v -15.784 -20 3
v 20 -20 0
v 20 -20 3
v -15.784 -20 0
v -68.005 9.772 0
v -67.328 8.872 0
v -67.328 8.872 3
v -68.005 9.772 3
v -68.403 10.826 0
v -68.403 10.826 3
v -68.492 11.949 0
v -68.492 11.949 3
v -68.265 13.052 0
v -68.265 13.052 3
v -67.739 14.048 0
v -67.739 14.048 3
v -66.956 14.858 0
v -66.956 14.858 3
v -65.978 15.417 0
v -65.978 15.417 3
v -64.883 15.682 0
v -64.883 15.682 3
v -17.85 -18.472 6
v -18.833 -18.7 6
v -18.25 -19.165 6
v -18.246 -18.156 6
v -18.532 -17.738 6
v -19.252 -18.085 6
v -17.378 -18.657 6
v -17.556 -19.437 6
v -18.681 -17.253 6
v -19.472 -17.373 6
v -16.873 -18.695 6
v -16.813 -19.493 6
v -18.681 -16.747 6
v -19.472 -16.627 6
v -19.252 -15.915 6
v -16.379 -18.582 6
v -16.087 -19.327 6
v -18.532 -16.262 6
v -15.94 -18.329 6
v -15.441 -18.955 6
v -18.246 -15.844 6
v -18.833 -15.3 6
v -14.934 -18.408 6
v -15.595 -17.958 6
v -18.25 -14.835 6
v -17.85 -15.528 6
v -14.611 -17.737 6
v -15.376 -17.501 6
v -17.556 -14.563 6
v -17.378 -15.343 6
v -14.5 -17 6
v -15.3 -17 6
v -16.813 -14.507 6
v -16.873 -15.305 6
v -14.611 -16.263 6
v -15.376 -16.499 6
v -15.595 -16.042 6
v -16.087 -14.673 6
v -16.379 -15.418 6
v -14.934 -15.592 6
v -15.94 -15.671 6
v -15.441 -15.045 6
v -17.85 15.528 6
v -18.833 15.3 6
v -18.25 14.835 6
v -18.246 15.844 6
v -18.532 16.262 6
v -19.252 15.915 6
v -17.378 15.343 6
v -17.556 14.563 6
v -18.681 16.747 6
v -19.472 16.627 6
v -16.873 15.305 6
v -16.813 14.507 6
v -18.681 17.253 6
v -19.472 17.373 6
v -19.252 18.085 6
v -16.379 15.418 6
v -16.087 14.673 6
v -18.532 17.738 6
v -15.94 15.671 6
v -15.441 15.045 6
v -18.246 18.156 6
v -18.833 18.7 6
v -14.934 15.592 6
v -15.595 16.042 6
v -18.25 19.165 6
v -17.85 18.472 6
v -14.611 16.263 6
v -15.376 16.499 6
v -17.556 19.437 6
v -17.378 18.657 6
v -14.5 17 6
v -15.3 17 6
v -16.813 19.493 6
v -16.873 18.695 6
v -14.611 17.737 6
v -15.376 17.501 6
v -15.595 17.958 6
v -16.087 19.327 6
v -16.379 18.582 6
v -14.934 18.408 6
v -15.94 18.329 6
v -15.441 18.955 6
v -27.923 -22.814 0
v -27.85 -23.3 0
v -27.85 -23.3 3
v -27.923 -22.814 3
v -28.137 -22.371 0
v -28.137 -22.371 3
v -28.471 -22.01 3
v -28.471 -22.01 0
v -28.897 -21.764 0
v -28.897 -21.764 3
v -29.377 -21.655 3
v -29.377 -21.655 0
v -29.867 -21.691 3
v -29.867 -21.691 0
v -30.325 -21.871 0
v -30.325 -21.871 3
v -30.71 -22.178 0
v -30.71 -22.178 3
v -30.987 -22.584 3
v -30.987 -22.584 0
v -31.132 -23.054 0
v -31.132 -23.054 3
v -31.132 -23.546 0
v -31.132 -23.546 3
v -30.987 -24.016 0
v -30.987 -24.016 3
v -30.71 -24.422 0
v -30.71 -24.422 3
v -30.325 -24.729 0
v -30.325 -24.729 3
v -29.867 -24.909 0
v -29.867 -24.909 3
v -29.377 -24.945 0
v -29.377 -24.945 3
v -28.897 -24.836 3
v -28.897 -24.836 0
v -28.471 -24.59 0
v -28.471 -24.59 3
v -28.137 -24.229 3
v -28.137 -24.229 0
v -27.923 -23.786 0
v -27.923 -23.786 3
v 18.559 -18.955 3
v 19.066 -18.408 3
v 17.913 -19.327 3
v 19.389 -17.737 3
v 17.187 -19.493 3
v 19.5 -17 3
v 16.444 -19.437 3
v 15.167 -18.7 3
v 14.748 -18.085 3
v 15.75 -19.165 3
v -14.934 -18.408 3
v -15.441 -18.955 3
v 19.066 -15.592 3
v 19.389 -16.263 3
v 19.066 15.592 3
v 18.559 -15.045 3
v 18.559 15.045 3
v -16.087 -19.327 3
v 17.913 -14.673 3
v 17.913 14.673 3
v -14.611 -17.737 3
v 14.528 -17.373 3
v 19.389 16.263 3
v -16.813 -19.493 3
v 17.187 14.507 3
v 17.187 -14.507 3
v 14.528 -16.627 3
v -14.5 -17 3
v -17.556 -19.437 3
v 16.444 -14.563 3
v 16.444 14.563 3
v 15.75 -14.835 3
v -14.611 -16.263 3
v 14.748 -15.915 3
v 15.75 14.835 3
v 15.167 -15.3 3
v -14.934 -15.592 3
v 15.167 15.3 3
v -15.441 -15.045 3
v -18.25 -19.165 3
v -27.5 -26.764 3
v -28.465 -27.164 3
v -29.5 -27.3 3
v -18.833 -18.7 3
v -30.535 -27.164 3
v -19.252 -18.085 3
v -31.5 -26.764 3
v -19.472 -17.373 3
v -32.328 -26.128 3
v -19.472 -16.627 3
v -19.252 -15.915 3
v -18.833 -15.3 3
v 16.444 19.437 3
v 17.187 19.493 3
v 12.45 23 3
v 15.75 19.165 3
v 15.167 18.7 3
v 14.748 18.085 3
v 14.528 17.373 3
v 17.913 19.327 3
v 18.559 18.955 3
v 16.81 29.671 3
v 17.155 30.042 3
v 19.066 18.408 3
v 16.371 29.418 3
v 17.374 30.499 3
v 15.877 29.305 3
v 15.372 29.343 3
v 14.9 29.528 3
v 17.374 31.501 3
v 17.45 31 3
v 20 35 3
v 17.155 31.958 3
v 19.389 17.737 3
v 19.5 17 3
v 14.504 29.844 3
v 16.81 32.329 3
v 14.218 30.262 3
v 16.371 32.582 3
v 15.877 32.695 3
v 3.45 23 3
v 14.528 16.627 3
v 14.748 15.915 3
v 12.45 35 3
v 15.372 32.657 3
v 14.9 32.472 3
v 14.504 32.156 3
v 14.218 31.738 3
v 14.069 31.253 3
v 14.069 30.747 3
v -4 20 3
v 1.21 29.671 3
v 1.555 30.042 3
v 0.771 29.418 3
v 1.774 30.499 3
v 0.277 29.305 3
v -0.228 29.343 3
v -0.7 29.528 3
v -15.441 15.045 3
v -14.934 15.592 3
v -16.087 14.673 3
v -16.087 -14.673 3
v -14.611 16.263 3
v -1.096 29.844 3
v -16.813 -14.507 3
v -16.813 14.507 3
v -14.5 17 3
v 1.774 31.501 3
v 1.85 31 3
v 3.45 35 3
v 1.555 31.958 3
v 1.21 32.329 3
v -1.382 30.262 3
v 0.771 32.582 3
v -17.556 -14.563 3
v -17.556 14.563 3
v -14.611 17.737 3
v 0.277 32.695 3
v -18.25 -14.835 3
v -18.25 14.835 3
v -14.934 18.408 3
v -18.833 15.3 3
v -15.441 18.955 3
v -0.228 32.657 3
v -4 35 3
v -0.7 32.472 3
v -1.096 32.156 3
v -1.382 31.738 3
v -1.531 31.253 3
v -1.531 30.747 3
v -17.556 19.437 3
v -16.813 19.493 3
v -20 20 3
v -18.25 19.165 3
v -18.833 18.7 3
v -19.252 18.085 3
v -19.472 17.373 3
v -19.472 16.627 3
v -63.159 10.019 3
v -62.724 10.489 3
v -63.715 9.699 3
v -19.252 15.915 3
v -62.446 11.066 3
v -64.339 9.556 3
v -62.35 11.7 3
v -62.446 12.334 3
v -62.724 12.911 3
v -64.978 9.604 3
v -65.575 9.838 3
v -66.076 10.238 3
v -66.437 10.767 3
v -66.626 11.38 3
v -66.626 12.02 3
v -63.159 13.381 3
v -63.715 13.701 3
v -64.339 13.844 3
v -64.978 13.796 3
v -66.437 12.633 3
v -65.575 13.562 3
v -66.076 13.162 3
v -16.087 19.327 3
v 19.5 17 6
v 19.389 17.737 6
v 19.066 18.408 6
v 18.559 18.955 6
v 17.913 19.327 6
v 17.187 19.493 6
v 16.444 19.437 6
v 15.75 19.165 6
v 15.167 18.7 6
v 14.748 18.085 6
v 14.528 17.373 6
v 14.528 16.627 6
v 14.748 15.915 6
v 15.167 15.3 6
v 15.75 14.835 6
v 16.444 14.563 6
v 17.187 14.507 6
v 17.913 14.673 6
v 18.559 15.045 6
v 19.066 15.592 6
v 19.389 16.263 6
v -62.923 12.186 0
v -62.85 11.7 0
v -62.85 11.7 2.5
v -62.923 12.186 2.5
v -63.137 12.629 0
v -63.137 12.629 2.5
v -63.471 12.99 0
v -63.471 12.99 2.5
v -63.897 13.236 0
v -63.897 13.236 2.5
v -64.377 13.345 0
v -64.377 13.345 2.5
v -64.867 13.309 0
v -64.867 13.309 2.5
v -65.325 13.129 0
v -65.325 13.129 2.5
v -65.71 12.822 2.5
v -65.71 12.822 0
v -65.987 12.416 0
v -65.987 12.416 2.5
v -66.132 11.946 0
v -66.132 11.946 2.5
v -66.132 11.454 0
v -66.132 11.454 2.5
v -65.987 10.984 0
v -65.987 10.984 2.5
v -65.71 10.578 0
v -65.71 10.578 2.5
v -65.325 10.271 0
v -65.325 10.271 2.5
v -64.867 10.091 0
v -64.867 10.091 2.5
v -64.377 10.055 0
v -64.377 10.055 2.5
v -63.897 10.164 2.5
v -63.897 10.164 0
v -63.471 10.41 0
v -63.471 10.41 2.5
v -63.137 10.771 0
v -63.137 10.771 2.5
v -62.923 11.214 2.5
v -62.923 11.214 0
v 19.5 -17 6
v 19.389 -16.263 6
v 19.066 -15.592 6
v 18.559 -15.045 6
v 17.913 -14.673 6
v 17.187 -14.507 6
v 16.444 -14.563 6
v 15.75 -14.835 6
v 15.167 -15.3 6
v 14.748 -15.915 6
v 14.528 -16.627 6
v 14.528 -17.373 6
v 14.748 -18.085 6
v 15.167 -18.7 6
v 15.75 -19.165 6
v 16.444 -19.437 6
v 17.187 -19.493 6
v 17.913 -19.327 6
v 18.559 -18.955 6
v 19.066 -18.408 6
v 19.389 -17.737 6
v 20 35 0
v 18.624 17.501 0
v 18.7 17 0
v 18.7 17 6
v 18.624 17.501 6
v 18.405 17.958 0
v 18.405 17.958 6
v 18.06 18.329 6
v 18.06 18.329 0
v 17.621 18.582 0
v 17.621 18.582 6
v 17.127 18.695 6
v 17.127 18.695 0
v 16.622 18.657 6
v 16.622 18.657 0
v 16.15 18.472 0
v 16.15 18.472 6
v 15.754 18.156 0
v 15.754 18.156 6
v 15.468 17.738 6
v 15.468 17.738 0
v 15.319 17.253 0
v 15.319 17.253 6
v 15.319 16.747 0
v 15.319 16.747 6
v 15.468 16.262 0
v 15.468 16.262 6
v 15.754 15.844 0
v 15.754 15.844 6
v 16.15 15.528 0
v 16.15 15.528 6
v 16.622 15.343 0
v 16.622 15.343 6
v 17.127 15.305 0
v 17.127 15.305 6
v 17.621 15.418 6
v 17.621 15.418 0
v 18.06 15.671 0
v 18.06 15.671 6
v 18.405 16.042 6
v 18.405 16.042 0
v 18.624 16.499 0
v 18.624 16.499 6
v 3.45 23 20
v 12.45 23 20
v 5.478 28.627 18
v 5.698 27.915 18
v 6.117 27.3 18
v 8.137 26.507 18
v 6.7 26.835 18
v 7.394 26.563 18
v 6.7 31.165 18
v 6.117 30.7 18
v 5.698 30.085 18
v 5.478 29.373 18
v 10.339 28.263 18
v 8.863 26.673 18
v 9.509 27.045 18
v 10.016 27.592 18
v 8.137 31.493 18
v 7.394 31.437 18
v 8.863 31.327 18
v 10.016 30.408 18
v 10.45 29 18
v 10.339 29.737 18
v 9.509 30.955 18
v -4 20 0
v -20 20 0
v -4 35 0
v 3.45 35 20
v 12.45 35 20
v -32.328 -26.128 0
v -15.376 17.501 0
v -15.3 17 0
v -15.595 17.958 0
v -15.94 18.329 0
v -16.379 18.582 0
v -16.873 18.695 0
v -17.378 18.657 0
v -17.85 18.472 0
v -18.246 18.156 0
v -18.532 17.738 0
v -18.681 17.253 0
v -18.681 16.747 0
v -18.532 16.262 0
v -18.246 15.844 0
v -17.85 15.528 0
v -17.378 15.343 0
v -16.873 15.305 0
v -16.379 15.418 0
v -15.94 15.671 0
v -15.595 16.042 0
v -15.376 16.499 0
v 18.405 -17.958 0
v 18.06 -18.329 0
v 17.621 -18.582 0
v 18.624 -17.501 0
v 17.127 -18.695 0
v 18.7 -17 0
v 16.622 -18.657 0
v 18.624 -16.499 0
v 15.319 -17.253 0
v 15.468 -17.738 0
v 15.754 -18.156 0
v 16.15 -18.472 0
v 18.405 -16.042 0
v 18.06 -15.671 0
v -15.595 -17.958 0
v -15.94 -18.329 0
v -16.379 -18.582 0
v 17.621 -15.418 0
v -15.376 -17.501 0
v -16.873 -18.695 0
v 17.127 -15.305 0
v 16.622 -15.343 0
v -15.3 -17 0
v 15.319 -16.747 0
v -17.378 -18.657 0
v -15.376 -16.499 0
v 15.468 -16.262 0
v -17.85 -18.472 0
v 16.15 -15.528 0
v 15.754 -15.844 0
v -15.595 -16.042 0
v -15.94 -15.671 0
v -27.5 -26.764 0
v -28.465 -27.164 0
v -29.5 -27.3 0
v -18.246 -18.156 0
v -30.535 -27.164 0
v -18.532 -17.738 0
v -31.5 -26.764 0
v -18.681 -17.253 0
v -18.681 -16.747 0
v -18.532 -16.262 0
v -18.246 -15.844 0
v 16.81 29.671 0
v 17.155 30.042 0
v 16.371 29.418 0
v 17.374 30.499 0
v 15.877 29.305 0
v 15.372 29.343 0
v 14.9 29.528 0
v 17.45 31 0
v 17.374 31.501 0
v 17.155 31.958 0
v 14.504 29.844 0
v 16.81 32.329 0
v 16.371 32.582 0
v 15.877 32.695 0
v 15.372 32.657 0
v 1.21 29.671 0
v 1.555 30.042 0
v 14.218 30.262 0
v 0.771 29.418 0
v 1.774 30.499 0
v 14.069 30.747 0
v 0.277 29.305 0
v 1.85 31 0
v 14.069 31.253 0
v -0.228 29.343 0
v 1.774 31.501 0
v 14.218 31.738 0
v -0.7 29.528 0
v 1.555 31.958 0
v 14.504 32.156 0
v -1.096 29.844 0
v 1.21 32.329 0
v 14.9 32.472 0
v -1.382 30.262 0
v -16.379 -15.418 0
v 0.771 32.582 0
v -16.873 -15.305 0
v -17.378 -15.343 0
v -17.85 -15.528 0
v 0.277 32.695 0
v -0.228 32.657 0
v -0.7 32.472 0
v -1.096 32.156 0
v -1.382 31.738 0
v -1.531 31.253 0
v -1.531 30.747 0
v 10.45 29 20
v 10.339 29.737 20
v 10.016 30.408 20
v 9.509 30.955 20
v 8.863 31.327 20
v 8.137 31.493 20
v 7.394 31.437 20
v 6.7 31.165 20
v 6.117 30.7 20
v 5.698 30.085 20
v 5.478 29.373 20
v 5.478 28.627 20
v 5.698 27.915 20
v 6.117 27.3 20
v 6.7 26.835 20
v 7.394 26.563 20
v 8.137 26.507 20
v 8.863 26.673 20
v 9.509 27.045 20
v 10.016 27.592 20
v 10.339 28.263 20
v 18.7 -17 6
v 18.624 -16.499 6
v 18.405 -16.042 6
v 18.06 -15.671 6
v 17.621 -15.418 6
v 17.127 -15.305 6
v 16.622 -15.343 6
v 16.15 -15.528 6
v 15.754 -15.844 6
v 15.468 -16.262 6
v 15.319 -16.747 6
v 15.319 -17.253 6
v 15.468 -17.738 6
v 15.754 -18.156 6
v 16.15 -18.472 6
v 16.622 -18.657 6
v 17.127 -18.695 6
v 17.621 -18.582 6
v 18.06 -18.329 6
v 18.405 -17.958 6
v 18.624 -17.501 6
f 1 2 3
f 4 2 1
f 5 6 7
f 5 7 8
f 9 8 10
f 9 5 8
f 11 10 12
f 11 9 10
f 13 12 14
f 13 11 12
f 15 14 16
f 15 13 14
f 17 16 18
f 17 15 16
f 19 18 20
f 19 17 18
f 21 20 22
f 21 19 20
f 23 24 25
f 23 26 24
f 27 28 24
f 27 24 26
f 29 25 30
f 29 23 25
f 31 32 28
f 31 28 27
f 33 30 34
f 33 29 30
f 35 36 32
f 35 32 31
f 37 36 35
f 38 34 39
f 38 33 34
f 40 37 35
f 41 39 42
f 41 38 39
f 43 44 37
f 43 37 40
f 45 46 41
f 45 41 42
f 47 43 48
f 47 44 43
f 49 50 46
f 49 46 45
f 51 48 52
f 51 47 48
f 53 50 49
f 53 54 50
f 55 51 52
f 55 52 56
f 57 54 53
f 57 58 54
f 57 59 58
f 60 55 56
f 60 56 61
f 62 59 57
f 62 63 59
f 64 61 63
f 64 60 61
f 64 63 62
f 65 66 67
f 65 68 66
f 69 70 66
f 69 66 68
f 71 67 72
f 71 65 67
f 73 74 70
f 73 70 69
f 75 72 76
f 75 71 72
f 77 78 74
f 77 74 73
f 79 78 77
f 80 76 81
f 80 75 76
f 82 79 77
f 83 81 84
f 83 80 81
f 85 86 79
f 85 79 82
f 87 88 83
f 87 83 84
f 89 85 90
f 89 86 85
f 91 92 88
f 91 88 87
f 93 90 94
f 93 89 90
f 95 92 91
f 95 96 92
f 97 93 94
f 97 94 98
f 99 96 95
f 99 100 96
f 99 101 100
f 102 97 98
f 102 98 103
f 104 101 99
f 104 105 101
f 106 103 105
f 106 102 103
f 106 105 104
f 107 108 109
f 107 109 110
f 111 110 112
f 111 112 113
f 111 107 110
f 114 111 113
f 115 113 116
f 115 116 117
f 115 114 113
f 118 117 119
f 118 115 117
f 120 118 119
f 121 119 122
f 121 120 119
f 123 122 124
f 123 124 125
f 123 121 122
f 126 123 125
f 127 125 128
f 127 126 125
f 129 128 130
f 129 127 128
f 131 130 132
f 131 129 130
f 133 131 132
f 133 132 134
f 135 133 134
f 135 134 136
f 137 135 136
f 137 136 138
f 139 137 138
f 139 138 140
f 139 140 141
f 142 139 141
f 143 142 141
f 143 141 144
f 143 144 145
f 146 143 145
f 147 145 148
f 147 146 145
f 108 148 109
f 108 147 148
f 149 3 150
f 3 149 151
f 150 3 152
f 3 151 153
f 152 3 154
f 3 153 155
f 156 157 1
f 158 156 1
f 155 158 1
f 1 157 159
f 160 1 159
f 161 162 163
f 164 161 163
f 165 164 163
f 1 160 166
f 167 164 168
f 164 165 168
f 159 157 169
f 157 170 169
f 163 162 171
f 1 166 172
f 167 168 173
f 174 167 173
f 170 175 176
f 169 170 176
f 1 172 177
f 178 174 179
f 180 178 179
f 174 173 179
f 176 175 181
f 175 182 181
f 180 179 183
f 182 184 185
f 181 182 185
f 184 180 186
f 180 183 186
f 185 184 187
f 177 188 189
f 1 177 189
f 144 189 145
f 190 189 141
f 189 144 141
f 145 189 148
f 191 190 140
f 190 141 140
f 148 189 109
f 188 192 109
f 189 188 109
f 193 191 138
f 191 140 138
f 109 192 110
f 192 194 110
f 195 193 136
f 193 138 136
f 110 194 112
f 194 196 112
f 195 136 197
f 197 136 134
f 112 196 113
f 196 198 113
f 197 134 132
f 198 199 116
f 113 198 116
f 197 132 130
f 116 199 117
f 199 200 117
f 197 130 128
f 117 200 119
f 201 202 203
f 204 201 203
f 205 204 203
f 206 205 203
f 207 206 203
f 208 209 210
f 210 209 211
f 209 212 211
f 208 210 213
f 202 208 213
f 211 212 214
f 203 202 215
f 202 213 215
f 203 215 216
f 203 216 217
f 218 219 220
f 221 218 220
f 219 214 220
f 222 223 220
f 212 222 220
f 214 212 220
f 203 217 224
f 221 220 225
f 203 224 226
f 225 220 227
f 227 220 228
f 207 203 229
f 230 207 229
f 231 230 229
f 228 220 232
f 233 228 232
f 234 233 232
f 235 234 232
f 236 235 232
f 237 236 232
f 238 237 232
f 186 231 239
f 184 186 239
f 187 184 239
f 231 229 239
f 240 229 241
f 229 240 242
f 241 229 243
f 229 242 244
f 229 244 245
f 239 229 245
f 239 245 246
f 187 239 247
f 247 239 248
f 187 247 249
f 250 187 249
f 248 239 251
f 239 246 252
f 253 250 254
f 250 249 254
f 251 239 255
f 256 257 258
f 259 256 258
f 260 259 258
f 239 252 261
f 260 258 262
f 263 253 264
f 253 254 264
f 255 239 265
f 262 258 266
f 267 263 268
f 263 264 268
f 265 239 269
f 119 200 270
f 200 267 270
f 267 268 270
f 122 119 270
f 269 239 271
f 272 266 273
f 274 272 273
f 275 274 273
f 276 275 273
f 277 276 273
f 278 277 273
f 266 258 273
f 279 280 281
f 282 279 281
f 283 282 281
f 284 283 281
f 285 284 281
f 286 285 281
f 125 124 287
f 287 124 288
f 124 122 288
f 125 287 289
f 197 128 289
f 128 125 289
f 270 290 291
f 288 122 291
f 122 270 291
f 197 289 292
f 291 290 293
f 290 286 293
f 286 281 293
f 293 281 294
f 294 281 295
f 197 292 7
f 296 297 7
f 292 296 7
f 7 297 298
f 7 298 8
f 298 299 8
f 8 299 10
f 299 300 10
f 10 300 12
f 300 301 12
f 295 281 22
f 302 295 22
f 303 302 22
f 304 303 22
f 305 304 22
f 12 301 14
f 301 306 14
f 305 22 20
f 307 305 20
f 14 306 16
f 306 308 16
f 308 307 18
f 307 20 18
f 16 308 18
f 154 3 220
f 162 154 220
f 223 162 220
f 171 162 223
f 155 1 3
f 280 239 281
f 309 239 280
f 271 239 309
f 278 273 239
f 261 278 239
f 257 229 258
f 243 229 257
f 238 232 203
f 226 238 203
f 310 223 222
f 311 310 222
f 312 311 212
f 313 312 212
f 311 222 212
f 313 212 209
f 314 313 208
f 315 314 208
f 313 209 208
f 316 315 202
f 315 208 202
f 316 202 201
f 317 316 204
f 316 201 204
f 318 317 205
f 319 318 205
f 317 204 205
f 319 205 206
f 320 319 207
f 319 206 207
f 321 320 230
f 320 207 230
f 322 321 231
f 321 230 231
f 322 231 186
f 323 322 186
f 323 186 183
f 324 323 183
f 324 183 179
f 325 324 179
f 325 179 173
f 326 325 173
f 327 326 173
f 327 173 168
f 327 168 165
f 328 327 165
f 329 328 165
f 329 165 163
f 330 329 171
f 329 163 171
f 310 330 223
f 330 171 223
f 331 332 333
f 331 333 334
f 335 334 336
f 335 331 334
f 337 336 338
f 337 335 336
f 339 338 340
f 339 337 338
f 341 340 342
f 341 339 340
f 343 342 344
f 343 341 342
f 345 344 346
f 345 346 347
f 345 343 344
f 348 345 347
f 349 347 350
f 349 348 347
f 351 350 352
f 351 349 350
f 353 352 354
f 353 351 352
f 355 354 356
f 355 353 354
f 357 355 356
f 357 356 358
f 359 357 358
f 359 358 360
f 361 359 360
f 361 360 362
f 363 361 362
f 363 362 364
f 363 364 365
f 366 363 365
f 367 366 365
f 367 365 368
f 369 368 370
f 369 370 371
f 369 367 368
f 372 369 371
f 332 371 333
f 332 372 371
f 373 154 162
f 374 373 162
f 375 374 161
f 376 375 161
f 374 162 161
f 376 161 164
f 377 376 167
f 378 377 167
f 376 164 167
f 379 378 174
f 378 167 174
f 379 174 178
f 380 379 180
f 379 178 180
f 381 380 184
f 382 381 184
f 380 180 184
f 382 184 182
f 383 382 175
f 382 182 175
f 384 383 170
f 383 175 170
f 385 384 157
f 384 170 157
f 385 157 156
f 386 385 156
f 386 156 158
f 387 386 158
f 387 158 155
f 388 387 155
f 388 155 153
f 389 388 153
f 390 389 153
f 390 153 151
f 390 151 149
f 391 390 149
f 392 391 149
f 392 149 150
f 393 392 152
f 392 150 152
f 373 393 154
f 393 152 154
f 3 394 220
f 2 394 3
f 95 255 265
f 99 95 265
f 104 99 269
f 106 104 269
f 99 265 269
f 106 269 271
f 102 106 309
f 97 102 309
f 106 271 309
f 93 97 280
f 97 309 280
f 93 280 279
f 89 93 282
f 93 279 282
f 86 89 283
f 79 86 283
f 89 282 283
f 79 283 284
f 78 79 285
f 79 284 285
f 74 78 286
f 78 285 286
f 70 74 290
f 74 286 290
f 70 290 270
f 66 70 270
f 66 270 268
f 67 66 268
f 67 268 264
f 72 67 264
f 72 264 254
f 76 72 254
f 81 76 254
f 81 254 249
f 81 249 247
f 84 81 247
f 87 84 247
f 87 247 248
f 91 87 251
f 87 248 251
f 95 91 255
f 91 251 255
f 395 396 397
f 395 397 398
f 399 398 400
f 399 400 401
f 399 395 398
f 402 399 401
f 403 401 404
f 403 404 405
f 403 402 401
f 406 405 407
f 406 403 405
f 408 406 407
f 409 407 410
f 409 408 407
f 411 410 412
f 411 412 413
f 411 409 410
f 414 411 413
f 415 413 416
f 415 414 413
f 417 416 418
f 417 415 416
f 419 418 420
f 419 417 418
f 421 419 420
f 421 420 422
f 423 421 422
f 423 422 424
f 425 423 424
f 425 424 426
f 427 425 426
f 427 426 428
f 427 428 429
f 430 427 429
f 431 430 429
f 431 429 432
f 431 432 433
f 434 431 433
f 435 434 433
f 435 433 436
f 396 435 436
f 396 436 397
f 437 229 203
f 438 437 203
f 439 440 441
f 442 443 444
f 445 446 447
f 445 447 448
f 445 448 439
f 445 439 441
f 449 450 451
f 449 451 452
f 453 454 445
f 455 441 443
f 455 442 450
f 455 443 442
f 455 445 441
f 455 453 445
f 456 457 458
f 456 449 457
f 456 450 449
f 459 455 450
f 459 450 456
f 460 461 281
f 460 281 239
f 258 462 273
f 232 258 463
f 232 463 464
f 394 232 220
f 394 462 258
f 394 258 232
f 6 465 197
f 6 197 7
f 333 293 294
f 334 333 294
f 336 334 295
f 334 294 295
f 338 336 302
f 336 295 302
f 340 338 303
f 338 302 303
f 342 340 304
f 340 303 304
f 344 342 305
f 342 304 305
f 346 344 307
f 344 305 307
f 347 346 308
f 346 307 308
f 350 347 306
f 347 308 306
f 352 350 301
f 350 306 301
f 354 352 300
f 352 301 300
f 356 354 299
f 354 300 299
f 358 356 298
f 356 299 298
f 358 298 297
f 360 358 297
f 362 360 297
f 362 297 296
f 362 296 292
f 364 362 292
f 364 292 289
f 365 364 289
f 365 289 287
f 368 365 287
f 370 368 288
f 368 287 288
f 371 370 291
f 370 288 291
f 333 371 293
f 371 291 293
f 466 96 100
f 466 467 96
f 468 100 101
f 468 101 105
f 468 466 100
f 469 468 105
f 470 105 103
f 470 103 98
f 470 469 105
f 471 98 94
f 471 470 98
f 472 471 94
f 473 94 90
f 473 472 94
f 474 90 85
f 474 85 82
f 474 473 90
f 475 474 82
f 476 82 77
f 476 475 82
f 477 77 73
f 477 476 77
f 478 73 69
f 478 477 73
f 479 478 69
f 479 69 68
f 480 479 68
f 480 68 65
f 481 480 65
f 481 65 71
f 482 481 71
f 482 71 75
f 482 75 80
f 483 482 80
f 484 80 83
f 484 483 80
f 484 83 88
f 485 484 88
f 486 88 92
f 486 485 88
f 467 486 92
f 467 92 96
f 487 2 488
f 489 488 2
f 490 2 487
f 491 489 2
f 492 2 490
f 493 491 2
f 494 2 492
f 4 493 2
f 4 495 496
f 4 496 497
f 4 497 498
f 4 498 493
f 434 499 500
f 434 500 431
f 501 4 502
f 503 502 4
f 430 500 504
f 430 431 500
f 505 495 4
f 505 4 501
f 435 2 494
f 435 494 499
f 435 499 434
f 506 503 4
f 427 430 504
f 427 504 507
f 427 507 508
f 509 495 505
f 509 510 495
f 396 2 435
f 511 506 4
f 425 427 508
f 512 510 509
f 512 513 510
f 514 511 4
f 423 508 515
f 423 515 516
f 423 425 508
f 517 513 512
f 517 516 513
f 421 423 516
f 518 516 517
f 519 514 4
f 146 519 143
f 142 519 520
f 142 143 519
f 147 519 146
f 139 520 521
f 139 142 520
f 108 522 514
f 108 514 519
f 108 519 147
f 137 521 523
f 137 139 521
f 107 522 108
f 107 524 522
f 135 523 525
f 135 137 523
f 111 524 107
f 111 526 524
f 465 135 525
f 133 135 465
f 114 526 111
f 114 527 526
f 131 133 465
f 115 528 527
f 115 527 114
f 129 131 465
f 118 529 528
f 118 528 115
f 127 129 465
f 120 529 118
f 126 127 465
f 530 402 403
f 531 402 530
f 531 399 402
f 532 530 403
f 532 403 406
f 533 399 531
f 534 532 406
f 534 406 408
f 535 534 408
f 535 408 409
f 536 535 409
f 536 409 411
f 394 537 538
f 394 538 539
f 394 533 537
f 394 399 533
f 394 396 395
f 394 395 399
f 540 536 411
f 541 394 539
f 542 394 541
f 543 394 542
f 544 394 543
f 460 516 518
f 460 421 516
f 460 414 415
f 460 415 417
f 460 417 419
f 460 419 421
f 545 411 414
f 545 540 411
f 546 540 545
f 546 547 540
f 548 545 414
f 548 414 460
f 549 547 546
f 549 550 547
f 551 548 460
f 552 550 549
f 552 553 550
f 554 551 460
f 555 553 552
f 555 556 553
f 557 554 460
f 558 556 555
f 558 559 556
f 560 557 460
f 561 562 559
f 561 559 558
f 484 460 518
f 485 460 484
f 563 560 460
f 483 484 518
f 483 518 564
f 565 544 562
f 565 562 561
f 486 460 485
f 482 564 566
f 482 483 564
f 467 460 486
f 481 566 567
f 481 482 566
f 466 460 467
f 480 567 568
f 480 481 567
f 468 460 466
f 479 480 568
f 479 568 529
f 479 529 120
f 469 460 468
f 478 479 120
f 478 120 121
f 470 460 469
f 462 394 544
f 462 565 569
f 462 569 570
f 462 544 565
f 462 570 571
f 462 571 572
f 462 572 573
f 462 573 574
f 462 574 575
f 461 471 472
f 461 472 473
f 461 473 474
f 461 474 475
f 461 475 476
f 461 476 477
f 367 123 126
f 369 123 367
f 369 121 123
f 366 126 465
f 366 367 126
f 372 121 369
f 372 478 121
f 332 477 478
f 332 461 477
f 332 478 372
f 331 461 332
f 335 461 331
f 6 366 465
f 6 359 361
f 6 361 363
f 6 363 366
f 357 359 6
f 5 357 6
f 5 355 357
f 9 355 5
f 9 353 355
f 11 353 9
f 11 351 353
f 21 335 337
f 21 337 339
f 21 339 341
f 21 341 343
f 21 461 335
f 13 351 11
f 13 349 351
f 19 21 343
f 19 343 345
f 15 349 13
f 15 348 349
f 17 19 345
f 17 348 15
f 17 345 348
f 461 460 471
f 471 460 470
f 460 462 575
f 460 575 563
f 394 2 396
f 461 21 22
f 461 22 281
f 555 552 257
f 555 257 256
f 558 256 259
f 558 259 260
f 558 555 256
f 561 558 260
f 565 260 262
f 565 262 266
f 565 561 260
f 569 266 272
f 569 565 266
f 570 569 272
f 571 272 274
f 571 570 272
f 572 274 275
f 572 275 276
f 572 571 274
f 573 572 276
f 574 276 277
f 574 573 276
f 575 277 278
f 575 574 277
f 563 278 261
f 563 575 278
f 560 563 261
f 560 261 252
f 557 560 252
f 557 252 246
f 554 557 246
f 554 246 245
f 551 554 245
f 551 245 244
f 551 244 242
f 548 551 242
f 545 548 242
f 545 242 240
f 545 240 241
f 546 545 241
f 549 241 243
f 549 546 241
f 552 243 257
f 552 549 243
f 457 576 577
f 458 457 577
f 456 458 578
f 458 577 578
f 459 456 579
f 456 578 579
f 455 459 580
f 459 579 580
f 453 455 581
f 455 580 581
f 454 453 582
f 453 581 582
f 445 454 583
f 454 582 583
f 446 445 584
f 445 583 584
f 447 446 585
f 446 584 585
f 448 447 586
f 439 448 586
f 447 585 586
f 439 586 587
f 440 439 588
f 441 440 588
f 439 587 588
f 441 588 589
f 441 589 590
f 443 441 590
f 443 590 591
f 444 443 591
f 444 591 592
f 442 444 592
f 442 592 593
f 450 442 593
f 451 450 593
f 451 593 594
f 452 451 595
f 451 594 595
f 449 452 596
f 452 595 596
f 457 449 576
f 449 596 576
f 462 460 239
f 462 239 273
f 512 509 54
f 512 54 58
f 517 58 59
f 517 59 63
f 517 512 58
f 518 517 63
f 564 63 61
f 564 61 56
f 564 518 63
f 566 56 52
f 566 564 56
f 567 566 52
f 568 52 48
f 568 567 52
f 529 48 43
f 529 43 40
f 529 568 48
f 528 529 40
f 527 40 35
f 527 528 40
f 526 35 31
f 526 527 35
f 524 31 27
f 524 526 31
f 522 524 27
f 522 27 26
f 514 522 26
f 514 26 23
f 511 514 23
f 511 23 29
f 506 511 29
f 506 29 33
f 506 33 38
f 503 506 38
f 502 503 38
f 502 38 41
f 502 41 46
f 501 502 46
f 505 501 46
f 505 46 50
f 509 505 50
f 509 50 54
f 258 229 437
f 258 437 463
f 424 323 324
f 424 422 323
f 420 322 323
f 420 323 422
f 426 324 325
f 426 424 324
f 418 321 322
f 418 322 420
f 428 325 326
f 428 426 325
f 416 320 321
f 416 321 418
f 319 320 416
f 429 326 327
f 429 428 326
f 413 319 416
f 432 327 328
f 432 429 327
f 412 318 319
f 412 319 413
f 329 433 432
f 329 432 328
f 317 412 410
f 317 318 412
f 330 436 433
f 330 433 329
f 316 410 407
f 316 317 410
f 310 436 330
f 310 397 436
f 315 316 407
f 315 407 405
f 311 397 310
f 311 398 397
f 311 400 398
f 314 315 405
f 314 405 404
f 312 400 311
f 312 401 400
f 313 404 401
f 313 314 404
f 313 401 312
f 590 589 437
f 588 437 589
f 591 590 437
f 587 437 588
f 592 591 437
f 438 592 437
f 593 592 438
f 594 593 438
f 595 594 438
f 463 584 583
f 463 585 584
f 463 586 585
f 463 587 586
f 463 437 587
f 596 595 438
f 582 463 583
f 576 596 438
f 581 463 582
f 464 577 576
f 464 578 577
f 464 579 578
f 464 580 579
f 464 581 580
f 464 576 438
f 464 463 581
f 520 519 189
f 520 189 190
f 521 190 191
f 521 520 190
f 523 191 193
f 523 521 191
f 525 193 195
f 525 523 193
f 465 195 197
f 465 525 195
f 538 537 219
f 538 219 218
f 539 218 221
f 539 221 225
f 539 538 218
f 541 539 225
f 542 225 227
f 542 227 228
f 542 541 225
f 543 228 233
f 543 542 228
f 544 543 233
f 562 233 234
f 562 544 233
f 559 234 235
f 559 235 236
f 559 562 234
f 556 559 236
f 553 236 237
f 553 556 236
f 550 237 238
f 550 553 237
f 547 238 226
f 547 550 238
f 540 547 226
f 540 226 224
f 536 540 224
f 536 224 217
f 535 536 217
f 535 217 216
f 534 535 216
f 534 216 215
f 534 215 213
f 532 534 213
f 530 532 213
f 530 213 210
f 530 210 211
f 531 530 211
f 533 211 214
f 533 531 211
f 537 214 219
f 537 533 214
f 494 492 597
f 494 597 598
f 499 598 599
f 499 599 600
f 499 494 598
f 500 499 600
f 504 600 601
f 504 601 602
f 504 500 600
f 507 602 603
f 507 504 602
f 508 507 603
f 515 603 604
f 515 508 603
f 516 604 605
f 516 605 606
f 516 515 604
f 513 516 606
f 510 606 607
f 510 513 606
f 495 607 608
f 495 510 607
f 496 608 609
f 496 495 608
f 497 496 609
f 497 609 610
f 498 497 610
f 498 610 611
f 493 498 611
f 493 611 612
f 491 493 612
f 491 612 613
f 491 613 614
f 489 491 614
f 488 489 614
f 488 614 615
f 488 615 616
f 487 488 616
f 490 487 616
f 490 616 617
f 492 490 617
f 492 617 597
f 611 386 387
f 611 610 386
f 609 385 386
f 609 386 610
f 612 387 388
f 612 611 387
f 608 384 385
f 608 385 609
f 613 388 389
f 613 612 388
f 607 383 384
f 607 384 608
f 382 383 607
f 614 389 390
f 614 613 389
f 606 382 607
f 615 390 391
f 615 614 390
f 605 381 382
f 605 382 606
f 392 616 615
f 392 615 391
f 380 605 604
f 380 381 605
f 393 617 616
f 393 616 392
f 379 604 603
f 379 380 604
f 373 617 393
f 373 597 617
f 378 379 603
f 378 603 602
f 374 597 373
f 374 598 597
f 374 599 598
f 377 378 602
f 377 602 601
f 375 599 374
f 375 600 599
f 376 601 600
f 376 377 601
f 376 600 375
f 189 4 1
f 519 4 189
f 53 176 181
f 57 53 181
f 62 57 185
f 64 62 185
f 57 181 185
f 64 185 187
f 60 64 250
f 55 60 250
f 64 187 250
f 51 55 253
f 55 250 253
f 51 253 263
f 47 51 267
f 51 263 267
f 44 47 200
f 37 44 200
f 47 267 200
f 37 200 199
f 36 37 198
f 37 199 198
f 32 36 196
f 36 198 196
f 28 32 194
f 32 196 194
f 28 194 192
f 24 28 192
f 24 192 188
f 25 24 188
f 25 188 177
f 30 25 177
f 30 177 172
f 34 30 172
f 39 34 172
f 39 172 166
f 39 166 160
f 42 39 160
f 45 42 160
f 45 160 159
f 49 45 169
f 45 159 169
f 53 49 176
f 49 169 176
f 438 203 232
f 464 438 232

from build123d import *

# Parameters (mm, degrees)
SKETCH1_R           = 1.7
SKETCH1_R_2         = 1.65
BOSS_EXTRUDE1_DEPTH = 3
CHAMFER2_SIZE       = 0.5
SKETCH2_W           = 9
SKETCH2_H           = 12
BOSS_EXTRUDE2_DEPTH = 17
SKETCH3_R           = 2.5
CUT_EXTRUDE1_DEPTH  = 2
SKETCH4_R           = 2.5
SKETCH4_R_2         = 1.7
BOSS_EXTRUDE3_DEPTH = 3


with BuildPart() as part:
    # Sketch1 → Boss-Extrude1 (new body)
    with BuildSketch(Plane.XY):
        with BuildLine():
            Line((20, 20), (20, -20))
            Line((20, -20), (-15.784232335, -20))
            Line((-15.784232335, -20), (-27.5, -26.764101615))
            ThreePointArc((-27.5, -26.764101615), (-30.022104769, -27.265779445), (-32.328427125, -26.128427125))
            Line((-32.328427125, -26.128427125), (-67.328427125, 8.871572875))
            ThreePointArc((-67.328427125, 8.871572875), (-68.264653884, 13.051806618), (-64.883087414, 15.681613245))
            Line((-64.883087414, 15.681613245), (-20, 20))
            Line((-20, 20), (-4, 20))
            Line((-4, 20), (-4, 35))
            Line((-4, 35), (20, 35))
            Line((20, 35), (20, 20))
        make_face()
        with Locations((-17, 17)):
            Circle(SKETCH1_R, mode=Mode.SUBTRACT)
        with Locations((17, 17)):
            Circle(SKETCH1_R, mode=Mode.SUBTRACT)
        with Locations((17, -17)):
            Circle(SKETCH1_R, mode=Mode.SUBTRACT)
        with Locations((-17, -17)):
            Circle(SKETCH1_R, mode=Mode.SUBTRACT)
        with Locations((0.15, 31)):
            Circle(SKETCH1_R, mode=Mode.SUBTRACT)
        with Locations((15.75, 31)):
            Circle(SKETCH1_R, mode=Mode.SUBTRACT)
        with Locations((-64.5, 11.7)):
            Circle(SKETCH1_R_2, mode=Mode.SUBTRACT)
        with Locations((-29.5, -23.3)):
            Circle(SKETCH1_R_2, mode=Mode.SUBTRACT)
    extrude(amount=BOSS_EXTRUDE1_DEPTH)

    # Chamfer2
    chamfer2_edges = [part.edges().sort_by_distance(p)[0] for p in [
        (-66.15, 11.7, 3),
    ]]
    chamfer(chamfer2_edges, length=CHAMFER2_SIZE)

    # Sketch2 → Boss-Extrude2 (add)
    with BuildSketch(Plane.XY.offset(3)):
        with Locations((7.95, 29)):
            Rectangle(SKETCH2_W, SKETCH2_H)
    extrude(amount=BOSS_EXTRUDE2_DEPTH)

    # Sketch3 → Cut-Extrude1 (cut)
    with BuildSketch(Plane.XY.offset(20)):
        with Locations((7.95, 29)):
            Circle(SKETCH3_R)
    extrude(amount=-CUT_EXTRUDE1_DEPTH, mode=Mode.SUBTRACT)

    # Sketch4 → Boss-Extrude3 (add)
    # profile 1 of 4: a face of its own
    with BuildSketch(Plane.XY.offset(3)):
        with Locations((-17, 17)):
            Circle(SKETCH4_R)
        with Locations((-17, 17)):
            Circle(SKETCH4_R_2, mode=Mode.SUBTRACT)
    # profile 2 of 4: a face of its own
    with BuildSketch(Plane.XY.offset(3)):
        with Locations((17, 17)):
            Circle(SKETCH4_R)
        with Locations((17, 17)):
            Circle(SKETCH4_R_2, mode=Mode.SUBTRACT)
    # profile 3 of 4: a face of its own
    with BuildSketch(Plane.XY.offset(3)):
        with Locations((-17, -17)):
            Circle(SKETCH4_R)
        with Locations((-17, -17)):
            Circle(SKETCH4_R_2, mode=Mode.SUBTRACT)
    # profile 4 of 4: a face of its own
    with BuildSketch(Plane.XY.offset(3)):
        with Locations((17, -17)):
            Circle(SKETCH4_R)
        with Locations((17, -17)):
            Circle(SKETCH4_R_2, mode=Mode.SUBTRACT)
    extrude(amount=BOSS_EXTRUDE3_DEPTH)


solid = part.part
